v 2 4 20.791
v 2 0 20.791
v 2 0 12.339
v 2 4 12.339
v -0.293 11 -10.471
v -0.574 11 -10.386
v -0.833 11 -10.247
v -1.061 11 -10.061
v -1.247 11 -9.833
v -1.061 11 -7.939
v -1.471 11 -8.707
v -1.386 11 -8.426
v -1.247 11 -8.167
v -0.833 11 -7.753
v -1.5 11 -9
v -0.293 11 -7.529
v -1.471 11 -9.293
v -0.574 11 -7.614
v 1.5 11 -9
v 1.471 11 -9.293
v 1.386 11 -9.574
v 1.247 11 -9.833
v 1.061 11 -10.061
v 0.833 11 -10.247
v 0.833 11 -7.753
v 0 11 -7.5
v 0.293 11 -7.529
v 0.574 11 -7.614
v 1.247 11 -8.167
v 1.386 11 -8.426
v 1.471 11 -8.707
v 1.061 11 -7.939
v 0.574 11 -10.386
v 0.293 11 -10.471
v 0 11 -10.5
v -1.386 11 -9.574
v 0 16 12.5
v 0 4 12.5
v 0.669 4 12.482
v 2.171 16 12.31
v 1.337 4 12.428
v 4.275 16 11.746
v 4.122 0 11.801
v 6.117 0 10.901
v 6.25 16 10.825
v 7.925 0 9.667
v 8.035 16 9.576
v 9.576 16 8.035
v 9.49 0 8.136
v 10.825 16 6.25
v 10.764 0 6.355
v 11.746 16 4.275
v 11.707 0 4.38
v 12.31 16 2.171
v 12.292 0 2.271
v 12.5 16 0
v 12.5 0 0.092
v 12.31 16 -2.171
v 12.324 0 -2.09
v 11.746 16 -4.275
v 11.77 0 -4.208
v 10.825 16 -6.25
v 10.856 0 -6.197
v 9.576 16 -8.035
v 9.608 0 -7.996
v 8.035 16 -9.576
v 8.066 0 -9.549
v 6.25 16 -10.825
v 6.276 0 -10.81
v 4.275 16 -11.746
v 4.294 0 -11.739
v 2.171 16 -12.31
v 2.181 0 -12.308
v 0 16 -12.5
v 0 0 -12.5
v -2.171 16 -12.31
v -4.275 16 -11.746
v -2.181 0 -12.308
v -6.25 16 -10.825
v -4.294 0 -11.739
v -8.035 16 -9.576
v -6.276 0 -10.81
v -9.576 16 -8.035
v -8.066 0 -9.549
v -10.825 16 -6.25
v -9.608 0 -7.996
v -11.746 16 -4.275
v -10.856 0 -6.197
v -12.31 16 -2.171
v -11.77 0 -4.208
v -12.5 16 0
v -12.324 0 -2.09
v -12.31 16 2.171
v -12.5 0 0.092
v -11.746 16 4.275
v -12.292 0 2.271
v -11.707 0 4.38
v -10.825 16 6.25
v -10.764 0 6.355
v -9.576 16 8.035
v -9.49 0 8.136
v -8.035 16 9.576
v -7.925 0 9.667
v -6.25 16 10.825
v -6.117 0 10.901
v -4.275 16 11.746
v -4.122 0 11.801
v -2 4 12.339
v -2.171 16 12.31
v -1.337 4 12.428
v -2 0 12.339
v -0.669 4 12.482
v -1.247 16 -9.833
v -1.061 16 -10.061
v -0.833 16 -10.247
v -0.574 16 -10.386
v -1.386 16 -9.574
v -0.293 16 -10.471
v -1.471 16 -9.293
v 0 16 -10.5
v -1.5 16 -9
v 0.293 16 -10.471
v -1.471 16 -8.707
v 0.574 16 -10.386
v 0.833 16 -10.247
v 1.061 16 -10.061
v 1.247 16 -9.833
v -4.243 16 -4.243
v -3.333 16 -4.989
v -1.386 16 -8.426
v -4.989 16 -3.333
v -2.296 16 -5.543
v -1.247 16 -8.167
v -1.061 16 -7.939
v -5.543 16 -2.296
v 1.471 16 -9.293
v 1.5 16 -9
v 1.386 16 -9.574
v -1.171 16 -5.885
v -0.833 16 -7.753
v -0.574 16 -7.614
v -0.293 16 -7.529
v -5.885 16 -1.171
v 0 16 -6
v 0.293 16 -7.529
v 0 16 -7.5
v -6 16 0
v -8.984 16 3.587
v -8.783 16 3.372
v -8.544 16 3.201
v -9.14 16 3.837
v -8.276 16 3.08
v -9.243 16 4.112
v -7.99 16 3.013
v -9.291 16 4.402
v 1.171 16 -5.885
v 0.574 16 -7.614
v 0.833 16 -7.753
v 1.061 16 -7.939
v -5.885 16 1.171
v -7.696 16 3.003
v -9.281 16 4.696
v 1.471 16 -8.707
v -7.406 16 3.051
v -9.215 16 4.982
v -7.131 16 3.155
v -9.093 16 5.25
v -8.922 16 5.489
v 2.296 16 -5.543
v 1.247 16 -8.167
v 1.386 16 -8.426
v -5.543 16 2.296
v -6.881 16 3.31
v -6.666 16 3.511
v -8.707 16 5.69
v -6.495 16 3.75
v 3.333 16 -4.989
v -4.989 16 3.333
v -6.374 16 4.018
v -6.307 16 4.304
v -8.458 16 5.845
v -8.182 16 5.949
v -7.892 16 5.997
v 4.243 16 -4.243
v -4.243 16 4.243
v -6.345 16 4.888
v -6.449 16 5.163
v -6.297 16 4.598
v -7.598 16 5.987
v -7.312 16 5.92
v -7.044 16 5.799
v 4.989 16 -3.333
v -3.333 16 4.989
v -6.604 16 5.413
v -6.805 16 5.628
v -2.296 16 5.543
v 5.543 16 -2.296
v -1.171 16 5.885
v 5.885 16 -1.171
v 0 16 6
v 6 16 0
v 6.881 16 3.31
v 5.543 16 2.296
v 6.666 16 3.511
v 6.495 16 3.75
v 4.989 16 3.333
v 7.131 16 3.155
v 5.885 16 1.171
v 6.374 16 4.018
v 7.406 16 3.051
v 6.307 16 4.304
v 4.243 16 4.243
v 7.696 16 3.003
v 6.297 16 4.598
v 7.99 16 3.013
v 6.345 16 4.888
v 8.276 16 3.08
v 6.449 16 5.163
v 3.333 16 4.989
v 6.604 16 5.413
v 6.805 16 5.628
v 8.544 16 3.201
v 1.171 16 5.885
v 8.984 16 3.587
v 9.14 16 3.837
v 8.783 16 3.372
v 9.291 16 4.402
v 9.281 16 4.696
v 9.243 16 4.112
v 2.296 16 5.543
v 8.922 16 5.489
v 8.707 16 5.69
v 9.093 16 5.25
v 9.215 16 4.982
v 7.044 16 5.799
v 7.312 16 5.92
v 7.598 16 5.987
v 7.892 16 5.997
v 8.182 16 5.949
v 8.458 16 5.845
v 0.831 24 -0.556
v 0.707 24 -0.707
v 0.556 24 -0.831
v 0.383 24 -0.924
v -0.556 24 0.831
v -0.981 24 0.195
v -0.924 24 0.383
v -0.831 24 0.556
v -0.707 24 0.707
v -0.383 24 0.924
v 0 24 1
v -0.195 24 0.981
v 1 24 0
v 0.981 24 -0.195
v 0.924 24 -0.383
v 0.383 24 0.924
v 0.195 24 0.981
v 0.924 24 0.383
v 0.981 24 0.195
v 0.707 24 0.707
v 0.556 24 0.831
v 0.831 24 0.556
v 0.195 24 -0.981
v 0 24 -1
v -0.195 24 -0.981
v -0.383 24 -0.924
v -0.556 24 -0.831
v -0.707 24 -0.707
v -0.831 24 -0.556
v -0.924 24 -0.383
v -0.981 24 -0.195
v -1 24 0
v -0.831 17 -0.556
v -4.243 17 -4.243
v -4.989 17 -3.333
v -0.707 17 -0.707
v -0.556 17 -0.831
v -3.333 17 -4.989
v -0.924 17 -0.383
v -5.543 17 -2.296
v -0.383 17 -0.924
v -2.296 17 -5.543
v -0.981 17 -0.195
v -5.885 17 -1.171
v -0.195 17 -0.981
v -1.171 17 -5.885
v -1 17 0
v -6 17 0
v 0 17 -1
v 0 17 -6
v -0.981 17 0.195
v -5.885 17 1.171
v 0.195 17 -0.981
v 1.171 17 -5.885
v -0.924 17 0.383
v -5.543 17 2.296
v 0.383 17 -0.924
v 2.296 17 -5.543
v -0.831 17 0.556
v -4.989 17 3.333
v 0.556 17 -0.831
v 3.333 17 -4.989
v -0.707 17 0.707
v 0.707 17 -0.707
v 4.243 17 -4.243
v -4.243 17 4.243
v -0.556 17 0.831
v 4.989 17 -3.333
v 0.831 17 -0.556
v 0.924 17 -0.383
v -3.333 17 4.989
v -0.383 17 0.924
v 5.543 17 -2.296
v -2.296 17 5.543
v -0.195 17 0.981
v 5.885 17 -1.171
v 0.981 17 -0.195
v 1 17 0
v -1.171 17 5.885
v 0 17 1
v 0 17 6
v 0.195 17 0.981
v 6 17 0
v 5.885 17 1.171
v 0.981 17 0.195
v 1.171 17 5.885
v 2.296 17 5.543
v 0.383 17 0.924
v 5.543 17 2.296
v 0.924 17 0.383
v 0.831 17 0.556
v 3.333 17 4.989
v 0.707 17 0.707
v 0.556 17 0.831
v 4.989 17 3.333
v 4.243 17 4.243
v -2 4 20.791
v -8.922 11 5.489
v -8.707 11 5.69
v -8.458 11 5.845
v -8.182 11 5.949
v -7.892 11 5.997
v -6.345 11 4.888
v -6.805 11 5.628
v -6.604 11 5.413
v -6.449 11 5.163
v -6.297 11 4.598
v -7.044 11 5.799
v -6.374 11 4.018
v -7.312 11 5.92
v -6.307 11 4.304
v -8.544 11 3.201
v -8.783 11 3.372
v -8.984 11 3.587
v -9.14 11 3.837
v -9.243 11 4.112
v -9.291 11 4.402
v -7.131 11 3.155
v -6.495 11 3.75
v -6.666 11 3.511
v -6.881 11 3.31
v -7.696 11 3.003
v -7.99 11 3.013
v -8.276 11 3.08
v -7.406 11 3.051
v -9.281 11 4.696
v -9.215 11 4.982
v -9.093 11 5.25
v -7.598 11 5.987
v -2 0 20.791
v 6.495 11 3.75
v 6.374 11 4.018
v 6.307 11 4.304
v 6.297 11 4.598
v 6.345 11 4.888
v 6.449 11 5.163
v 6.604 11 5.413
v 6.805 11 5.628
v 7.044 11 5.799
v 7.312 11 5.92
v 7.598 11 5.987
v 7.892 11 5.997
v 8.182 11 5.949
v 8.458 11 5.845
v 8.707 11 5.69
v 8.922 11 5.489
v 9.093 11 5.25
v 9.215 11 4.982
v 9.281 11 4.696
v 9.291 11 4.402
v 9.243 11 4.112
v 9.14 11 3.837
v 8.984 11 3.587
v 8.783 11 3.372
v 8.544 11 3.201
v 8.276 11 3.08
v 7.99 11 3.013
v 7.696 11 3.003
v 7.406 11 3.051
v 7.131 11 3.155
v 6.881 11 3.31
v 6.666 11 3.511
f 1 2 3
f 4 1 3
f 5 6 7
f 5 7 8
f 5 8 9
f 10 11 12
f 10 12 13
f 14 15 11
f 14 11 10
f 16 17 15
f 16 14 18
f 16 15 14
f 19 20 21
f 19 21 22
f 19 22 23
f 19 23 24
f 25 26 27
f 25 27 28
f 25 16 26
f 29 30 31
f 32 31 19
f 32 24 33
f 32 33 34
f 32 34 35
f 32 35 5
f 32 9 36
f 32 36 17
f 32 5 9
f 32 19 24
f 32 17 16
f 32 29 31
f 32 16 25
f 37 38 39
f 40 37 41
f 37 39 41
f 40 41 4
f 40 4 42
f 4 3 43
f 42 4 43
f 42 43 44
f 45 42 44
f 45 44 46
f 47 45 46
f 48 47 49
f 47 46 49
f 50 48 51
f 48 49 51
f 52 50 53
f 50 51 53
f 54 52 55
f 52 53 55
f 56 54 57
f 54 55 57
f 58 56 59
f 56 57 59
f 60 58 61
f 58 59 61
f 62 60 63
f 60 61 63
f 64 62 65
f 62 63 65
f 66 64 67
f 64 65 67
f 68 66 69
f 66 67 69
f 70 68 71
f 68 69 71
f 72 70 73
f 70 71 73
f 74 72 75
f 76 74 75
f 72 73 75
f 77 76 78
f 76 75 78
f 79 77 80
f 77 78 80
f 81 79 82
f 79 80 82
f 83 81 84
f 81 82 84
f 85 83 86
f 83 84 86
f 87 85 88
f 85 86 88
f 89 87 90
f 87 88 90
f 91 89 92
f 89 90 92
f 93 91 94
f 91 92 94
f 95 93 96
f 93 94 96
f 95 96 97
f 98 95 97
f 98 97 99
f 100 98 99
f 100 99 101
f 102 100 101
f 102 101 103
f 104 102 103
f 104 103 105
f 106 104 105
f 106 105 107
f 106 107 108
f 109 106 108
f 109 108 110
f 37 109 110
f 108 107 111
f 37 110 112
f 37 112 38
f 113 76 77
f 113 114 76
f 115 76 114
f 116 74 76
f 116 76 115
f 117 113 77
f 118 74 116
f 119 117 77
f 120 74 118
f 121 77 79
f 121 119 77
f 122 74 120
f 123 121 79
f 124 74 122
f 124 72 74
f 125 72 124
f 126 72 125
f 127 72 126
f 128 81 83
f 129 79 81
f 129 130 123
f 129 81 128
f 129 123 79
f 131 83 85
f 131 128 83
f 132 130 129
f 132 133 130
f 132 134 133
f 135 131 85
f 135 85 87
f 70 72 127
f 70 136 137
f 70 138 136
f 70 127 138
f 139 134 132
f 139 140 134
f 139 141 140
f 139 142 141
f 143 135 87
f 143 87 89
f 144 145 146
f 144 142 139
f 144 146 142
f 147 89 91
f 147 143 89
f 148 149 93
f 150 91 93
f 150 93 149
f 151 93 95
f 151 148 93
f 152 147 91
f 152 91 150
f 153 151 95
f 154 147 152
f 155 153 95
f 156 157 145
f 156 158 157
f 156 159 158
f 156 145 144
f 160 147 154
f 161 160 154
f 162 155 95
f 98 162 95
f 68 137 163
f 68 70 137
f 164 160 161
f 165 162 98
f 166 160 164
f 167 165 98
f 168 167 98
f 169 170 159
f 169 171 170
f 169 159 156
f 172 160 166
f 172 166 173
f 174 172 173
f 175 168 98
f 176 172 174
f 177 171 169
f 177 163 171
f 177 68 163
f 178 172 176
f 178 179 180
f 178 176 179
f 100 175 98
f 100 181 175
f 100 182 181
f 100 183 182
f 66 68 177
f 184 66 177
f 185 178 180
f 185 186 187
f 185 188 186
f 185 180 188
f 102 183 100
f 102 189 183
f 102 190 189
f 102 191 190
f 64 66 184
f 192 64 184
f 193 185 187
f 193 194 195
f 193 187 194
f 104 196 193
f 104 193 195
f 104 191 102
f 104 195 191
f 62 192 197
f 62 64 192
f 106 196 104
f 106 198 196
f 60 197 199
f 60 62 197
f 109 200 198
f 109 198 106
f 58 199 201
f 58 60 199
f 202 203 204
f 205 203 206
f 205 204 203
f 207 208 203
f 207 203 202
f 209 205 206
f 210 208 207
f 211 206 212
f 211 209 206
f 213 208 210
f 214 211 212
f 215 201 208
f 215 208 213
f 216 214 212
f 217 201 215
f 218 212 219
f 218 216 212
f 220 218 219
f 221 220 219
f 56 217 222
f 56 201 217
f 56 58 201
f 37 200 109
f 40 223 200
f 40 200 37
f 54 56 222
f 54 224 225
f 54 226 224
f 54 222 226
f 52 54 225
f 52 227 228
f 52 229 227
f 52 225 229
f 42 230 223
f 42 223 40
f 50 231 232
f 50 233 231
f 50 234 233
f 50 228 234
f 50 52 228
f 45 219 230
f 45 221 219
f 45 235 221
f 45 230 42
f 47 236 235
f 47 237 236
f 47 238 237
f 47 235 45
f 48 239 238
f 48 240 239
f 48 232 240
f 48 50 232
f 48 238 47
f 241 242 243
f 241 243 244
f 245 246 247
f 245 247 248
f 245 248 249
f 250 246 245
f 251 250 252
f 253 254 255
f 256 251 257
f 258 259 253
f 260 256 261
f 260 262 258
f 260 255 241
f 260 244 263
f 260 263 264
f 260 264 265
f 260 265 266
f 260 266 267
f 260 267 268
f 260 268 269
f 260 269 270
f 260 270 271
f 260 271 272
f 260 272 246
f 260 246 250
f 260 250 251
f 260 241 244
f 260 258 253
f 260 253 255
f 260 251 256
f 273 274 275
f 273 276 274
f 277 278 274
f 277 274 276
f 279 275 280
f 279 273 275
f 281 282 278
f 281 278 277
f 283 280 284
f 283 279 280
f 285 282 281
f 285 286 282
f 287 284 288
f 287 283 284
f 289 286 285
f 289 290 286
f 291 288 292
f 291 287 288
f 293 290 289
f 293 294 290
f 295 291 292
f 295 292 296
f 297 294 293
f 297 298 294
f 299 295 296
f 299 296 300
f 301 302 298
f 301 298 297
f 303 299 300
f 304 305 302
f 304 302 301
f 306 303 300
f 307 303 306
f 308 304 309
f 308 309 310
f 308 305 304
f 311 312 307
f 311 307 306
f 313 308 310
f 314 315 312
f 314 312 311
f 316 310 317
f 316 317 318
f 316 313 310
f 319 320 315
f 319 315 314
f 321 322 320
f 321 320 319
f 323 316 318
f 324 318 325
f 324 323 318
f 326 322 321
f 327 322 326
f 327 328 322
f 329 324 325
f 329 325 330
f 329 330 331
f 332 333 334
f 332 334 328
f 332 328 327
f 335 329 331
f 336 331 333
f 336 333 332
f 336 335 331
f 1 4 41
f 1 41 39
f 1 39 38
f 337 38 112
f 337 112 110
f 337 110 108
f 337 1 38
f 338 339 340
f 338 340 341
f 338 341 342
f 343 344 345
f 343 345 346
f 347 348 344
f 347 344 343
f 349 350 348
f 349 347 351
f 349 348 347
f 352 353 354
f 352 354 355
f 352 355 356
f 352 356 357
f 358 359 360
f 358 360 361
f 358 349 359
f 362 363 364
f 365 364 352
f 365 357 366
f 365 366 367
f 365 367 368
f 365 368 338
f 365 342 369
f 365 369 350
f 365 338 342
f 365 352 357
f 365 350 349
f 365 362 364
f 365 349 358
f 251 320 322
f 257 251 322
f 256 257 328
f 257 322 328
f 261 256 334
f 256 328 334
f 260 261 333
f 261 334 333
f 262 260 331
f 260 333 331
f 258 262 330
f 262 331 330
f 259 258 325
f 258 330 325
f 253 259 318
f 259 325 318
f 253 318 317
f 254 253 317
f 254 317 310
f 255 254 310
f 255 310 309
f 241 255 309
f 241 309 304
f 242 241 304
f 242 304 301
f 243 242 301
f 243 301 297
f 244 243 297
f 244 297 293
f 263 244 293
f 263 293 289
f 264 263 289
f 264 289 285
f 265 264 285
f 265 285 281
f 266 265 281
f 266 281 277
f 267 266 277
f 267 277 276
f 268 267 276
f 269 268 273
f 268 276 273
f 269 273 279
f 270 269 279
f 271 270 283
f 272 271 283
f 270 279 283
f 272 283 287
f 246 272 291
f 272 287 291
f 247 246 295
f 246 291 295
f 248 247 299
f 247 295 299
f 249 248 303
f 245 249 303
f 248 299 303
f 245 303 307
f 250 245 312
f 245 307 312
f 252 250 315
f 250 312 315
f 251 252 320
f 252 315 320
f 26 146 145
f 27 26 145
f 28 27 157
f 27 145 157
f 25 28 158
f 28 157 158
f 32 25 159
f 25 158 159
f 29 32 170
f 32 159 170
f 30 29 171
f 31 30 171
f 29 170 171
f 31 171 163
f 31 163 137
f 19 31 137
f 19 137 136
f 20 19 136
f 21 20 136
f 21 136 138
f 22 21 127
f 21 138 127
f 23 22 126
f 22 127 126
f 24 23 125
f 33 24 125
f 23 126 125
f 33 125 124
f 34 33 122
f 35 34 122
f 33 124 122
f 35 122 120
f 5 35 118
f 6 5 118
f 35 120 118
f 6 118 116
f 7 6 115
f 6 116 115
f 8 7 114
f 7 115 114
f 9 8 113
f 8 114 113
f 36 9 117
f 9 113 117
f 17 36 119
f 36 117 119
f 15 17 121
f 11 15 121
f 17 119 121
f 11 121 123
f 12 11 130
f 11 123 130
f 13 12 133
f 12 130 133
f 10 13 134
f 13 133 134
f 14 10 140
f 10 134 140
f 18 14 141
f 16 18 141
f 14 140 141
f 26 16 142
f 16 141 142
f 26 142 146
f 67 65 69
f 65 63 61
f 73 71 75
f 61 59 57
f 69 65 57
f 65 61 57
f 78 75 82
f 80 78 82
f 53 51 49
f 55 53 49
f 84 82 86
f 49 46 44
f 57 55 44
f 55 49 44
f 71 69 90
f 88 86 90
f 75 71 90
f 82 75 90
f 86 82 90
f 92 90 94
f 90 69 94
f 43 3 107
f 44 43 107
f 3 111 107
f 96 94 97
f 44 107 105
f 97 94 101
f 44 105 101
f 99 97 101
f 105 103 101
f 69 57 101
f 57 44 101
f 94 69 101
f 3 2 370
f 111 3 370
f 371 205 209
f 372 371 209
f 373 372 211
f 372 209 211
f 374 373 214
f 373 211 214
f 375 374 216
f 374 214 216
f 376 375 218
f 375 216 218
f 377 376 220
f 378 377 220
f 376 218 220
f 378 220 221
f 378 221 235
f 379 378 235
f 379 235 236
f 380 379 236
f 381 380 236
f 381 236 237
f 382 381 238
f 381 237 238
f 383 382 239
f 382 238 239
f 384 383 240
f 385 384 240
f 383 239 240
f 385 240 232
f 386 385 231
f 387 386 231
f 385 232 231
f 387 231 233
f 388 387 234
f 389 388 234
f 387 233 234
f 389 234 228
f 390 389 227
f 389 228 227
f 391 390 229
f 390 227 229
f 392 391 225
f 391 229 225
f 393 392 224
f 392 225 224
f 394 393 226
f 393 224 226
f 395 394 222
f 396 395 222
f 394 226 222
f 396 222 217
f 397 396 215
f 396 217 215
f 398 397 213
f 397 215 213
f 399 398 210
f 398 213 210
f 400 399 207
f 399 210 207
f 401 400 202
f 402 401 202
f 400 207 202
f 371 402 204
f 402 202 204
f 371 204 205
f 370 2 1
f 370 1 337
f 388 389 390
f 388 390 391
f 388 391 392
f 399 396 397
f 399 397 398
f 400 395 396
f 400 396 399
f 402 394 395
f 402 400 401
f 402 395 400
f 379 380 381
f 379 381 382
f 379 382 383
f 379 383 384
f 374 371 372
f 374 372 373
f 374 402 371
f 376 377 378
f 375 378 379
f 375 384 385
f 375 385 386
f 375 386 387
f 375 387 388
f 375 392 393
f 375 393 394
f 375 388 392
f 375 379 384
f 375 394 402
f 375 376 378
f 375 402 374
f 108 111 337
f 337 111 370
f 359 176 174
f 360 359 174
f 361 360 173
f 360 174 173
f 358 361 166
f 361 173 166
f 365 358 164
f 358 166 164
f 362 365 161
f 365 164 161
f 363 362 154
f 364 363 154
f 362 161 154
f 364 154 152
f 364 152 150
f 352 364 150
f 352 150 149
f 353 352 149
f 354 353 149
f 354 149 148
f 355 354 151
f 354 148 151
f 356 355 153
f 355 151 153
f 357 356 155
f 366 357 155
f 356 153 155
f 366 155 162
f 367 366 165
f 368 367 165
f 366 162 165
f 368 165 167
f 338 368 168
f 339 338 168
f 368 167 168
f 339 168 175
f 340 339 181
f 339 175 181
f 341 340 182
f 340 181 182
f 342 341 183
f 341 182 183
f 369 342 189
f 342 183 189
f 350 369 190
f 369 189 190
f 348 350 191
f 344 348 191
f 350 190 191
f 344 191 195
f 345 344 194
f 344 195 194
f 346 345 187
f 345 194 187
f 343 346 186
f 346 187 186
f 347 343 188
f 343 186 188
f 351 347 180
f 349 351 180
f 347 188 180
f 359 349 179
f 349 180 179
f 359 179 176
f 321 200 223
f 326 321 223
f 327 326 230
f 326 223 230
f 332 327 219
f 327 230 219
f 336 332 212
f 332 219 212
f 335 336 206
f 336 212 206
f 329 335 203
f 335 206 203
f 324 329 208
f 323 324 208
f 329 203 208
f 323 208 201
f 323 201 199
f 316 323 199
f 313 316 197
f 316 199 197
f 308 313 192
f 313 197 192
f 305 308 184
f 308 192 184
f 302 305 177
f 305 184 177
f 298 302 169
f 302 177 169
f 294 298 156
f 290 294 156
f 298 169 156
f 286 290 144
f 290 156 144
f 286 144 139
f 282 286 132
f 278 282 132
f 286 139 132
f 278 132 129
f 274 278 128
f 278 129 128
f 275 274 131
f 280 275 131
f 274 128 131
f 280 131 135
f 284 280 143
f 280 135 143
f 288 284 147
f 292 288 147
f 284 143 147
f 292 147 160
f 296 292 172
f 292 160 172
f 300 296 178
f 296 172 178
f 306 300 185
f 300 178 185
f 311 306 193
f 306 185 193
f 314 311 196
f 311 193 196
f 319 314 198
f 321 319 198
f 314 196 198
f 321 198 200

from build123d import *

# Parameters (mm, degrees)
ESQUISSE1_R                  = 12.5
BOSS_EXTRU_1_DEPTH           = 16
ESQUISSE2_R                  = 1
BOSS_EXTRU_2_DEPTH           = 8
BOSS_EXTRU_3_DEPTH           = 4
ESQUISSE5_R                  = 1.5
ENL_V_MAT_EXTRU_1_DEPTH      = 5
R_P_TITION_CIRCULAIRE1_COUNT = 3
ESQUISSE6_R                  = 6
BOSS_EXTRU_4_DEPTH           = 1


with BuildPart() as part:
    # Esquisse1 → Boss.-Extru.1 (new body)
    with BuildSketch(Plane(origin=(0, 0, 0), x_dir=(1, 0, 0), z_dir=(0, 1, 0))):
        with Locations(Location((0, 0, 0), (0, 0, 270))):
            Circle(ESQUISSE1_R)
    extrude(amount=BOSS_EXTRU_1_DEPTH)

    # Esquisse2 → Boss.-Extru.2 (add)
    with BuildSketch(Plane(origin=(0, 16, 0), x_dir=(1, 0, 0), z_dir=(0, 1, 0))):
        with Locations(Location((0, 0, 0), (0, 0, 270))):
            Circle(ESQUISSE2_R)
    extrude(amount=BOSS_EXTRU_2_DEPTH)

    # Esquisse4 → Boss.-Extru.3 (add)
    with BuildSketch(Plane.XZ):
        Polygon((0, 20.790629037), (2, 20.790629037), (2, 9.492710375), (0, 9.492710375), (-2, 9.492710375), (-2, 20.790629037), align=None)
    extrude(amount=-BOSS_EXTRU_3_DEPTH)

    # Esquisse5 → Enlèv. mat.-Extru.1 (cut)
    with BuildSketch(Plane(origin=(0, 16, 0), x_dir=(1, 0, 0), z_dir=(0, 1, 0))):
        with Locations(Location((0, 9, 0), (0, 0, 270))):
            Circle(ESQUISSE5_R)
    enl_v_mat_extru_1 = extrude(amount=-ENL_V_MAT_EXTRU_1_DEPTH, mode=Mode.SUBTRACT)

    # Répétition circulaire1: Enlèv. mat.-Extru.1 ×3 about axis
    r_p_tition_circulaire1_axis = Axis((0, 0, 0), (0, 1, 0))
    for i in range(1, R_P_TITION_CIRCULAIRE1_COUNT):
        add(enl_v_mat_extru_1.rotate(r_p_tition_circulaire1_axis, i * 360 / R_P_TITION_CIRCULAIRE1_COUNT), mode=Mode.SUBTRACT)

    # Esquisse6 → Boss.-Extru.4 (add)
    with BuildSketch(Plane(origin=(0, 16, 0), x_dir=(1, 0, 0), z_dir=(0, 1, 0))):
        with Locations(Location((0, 0, 0), (0, 0, 270))):
            Circle(ESQUISSE6_R)
    extrude(amount=BOSS_EXTRU_4_DEPTH)


solid = part.part
